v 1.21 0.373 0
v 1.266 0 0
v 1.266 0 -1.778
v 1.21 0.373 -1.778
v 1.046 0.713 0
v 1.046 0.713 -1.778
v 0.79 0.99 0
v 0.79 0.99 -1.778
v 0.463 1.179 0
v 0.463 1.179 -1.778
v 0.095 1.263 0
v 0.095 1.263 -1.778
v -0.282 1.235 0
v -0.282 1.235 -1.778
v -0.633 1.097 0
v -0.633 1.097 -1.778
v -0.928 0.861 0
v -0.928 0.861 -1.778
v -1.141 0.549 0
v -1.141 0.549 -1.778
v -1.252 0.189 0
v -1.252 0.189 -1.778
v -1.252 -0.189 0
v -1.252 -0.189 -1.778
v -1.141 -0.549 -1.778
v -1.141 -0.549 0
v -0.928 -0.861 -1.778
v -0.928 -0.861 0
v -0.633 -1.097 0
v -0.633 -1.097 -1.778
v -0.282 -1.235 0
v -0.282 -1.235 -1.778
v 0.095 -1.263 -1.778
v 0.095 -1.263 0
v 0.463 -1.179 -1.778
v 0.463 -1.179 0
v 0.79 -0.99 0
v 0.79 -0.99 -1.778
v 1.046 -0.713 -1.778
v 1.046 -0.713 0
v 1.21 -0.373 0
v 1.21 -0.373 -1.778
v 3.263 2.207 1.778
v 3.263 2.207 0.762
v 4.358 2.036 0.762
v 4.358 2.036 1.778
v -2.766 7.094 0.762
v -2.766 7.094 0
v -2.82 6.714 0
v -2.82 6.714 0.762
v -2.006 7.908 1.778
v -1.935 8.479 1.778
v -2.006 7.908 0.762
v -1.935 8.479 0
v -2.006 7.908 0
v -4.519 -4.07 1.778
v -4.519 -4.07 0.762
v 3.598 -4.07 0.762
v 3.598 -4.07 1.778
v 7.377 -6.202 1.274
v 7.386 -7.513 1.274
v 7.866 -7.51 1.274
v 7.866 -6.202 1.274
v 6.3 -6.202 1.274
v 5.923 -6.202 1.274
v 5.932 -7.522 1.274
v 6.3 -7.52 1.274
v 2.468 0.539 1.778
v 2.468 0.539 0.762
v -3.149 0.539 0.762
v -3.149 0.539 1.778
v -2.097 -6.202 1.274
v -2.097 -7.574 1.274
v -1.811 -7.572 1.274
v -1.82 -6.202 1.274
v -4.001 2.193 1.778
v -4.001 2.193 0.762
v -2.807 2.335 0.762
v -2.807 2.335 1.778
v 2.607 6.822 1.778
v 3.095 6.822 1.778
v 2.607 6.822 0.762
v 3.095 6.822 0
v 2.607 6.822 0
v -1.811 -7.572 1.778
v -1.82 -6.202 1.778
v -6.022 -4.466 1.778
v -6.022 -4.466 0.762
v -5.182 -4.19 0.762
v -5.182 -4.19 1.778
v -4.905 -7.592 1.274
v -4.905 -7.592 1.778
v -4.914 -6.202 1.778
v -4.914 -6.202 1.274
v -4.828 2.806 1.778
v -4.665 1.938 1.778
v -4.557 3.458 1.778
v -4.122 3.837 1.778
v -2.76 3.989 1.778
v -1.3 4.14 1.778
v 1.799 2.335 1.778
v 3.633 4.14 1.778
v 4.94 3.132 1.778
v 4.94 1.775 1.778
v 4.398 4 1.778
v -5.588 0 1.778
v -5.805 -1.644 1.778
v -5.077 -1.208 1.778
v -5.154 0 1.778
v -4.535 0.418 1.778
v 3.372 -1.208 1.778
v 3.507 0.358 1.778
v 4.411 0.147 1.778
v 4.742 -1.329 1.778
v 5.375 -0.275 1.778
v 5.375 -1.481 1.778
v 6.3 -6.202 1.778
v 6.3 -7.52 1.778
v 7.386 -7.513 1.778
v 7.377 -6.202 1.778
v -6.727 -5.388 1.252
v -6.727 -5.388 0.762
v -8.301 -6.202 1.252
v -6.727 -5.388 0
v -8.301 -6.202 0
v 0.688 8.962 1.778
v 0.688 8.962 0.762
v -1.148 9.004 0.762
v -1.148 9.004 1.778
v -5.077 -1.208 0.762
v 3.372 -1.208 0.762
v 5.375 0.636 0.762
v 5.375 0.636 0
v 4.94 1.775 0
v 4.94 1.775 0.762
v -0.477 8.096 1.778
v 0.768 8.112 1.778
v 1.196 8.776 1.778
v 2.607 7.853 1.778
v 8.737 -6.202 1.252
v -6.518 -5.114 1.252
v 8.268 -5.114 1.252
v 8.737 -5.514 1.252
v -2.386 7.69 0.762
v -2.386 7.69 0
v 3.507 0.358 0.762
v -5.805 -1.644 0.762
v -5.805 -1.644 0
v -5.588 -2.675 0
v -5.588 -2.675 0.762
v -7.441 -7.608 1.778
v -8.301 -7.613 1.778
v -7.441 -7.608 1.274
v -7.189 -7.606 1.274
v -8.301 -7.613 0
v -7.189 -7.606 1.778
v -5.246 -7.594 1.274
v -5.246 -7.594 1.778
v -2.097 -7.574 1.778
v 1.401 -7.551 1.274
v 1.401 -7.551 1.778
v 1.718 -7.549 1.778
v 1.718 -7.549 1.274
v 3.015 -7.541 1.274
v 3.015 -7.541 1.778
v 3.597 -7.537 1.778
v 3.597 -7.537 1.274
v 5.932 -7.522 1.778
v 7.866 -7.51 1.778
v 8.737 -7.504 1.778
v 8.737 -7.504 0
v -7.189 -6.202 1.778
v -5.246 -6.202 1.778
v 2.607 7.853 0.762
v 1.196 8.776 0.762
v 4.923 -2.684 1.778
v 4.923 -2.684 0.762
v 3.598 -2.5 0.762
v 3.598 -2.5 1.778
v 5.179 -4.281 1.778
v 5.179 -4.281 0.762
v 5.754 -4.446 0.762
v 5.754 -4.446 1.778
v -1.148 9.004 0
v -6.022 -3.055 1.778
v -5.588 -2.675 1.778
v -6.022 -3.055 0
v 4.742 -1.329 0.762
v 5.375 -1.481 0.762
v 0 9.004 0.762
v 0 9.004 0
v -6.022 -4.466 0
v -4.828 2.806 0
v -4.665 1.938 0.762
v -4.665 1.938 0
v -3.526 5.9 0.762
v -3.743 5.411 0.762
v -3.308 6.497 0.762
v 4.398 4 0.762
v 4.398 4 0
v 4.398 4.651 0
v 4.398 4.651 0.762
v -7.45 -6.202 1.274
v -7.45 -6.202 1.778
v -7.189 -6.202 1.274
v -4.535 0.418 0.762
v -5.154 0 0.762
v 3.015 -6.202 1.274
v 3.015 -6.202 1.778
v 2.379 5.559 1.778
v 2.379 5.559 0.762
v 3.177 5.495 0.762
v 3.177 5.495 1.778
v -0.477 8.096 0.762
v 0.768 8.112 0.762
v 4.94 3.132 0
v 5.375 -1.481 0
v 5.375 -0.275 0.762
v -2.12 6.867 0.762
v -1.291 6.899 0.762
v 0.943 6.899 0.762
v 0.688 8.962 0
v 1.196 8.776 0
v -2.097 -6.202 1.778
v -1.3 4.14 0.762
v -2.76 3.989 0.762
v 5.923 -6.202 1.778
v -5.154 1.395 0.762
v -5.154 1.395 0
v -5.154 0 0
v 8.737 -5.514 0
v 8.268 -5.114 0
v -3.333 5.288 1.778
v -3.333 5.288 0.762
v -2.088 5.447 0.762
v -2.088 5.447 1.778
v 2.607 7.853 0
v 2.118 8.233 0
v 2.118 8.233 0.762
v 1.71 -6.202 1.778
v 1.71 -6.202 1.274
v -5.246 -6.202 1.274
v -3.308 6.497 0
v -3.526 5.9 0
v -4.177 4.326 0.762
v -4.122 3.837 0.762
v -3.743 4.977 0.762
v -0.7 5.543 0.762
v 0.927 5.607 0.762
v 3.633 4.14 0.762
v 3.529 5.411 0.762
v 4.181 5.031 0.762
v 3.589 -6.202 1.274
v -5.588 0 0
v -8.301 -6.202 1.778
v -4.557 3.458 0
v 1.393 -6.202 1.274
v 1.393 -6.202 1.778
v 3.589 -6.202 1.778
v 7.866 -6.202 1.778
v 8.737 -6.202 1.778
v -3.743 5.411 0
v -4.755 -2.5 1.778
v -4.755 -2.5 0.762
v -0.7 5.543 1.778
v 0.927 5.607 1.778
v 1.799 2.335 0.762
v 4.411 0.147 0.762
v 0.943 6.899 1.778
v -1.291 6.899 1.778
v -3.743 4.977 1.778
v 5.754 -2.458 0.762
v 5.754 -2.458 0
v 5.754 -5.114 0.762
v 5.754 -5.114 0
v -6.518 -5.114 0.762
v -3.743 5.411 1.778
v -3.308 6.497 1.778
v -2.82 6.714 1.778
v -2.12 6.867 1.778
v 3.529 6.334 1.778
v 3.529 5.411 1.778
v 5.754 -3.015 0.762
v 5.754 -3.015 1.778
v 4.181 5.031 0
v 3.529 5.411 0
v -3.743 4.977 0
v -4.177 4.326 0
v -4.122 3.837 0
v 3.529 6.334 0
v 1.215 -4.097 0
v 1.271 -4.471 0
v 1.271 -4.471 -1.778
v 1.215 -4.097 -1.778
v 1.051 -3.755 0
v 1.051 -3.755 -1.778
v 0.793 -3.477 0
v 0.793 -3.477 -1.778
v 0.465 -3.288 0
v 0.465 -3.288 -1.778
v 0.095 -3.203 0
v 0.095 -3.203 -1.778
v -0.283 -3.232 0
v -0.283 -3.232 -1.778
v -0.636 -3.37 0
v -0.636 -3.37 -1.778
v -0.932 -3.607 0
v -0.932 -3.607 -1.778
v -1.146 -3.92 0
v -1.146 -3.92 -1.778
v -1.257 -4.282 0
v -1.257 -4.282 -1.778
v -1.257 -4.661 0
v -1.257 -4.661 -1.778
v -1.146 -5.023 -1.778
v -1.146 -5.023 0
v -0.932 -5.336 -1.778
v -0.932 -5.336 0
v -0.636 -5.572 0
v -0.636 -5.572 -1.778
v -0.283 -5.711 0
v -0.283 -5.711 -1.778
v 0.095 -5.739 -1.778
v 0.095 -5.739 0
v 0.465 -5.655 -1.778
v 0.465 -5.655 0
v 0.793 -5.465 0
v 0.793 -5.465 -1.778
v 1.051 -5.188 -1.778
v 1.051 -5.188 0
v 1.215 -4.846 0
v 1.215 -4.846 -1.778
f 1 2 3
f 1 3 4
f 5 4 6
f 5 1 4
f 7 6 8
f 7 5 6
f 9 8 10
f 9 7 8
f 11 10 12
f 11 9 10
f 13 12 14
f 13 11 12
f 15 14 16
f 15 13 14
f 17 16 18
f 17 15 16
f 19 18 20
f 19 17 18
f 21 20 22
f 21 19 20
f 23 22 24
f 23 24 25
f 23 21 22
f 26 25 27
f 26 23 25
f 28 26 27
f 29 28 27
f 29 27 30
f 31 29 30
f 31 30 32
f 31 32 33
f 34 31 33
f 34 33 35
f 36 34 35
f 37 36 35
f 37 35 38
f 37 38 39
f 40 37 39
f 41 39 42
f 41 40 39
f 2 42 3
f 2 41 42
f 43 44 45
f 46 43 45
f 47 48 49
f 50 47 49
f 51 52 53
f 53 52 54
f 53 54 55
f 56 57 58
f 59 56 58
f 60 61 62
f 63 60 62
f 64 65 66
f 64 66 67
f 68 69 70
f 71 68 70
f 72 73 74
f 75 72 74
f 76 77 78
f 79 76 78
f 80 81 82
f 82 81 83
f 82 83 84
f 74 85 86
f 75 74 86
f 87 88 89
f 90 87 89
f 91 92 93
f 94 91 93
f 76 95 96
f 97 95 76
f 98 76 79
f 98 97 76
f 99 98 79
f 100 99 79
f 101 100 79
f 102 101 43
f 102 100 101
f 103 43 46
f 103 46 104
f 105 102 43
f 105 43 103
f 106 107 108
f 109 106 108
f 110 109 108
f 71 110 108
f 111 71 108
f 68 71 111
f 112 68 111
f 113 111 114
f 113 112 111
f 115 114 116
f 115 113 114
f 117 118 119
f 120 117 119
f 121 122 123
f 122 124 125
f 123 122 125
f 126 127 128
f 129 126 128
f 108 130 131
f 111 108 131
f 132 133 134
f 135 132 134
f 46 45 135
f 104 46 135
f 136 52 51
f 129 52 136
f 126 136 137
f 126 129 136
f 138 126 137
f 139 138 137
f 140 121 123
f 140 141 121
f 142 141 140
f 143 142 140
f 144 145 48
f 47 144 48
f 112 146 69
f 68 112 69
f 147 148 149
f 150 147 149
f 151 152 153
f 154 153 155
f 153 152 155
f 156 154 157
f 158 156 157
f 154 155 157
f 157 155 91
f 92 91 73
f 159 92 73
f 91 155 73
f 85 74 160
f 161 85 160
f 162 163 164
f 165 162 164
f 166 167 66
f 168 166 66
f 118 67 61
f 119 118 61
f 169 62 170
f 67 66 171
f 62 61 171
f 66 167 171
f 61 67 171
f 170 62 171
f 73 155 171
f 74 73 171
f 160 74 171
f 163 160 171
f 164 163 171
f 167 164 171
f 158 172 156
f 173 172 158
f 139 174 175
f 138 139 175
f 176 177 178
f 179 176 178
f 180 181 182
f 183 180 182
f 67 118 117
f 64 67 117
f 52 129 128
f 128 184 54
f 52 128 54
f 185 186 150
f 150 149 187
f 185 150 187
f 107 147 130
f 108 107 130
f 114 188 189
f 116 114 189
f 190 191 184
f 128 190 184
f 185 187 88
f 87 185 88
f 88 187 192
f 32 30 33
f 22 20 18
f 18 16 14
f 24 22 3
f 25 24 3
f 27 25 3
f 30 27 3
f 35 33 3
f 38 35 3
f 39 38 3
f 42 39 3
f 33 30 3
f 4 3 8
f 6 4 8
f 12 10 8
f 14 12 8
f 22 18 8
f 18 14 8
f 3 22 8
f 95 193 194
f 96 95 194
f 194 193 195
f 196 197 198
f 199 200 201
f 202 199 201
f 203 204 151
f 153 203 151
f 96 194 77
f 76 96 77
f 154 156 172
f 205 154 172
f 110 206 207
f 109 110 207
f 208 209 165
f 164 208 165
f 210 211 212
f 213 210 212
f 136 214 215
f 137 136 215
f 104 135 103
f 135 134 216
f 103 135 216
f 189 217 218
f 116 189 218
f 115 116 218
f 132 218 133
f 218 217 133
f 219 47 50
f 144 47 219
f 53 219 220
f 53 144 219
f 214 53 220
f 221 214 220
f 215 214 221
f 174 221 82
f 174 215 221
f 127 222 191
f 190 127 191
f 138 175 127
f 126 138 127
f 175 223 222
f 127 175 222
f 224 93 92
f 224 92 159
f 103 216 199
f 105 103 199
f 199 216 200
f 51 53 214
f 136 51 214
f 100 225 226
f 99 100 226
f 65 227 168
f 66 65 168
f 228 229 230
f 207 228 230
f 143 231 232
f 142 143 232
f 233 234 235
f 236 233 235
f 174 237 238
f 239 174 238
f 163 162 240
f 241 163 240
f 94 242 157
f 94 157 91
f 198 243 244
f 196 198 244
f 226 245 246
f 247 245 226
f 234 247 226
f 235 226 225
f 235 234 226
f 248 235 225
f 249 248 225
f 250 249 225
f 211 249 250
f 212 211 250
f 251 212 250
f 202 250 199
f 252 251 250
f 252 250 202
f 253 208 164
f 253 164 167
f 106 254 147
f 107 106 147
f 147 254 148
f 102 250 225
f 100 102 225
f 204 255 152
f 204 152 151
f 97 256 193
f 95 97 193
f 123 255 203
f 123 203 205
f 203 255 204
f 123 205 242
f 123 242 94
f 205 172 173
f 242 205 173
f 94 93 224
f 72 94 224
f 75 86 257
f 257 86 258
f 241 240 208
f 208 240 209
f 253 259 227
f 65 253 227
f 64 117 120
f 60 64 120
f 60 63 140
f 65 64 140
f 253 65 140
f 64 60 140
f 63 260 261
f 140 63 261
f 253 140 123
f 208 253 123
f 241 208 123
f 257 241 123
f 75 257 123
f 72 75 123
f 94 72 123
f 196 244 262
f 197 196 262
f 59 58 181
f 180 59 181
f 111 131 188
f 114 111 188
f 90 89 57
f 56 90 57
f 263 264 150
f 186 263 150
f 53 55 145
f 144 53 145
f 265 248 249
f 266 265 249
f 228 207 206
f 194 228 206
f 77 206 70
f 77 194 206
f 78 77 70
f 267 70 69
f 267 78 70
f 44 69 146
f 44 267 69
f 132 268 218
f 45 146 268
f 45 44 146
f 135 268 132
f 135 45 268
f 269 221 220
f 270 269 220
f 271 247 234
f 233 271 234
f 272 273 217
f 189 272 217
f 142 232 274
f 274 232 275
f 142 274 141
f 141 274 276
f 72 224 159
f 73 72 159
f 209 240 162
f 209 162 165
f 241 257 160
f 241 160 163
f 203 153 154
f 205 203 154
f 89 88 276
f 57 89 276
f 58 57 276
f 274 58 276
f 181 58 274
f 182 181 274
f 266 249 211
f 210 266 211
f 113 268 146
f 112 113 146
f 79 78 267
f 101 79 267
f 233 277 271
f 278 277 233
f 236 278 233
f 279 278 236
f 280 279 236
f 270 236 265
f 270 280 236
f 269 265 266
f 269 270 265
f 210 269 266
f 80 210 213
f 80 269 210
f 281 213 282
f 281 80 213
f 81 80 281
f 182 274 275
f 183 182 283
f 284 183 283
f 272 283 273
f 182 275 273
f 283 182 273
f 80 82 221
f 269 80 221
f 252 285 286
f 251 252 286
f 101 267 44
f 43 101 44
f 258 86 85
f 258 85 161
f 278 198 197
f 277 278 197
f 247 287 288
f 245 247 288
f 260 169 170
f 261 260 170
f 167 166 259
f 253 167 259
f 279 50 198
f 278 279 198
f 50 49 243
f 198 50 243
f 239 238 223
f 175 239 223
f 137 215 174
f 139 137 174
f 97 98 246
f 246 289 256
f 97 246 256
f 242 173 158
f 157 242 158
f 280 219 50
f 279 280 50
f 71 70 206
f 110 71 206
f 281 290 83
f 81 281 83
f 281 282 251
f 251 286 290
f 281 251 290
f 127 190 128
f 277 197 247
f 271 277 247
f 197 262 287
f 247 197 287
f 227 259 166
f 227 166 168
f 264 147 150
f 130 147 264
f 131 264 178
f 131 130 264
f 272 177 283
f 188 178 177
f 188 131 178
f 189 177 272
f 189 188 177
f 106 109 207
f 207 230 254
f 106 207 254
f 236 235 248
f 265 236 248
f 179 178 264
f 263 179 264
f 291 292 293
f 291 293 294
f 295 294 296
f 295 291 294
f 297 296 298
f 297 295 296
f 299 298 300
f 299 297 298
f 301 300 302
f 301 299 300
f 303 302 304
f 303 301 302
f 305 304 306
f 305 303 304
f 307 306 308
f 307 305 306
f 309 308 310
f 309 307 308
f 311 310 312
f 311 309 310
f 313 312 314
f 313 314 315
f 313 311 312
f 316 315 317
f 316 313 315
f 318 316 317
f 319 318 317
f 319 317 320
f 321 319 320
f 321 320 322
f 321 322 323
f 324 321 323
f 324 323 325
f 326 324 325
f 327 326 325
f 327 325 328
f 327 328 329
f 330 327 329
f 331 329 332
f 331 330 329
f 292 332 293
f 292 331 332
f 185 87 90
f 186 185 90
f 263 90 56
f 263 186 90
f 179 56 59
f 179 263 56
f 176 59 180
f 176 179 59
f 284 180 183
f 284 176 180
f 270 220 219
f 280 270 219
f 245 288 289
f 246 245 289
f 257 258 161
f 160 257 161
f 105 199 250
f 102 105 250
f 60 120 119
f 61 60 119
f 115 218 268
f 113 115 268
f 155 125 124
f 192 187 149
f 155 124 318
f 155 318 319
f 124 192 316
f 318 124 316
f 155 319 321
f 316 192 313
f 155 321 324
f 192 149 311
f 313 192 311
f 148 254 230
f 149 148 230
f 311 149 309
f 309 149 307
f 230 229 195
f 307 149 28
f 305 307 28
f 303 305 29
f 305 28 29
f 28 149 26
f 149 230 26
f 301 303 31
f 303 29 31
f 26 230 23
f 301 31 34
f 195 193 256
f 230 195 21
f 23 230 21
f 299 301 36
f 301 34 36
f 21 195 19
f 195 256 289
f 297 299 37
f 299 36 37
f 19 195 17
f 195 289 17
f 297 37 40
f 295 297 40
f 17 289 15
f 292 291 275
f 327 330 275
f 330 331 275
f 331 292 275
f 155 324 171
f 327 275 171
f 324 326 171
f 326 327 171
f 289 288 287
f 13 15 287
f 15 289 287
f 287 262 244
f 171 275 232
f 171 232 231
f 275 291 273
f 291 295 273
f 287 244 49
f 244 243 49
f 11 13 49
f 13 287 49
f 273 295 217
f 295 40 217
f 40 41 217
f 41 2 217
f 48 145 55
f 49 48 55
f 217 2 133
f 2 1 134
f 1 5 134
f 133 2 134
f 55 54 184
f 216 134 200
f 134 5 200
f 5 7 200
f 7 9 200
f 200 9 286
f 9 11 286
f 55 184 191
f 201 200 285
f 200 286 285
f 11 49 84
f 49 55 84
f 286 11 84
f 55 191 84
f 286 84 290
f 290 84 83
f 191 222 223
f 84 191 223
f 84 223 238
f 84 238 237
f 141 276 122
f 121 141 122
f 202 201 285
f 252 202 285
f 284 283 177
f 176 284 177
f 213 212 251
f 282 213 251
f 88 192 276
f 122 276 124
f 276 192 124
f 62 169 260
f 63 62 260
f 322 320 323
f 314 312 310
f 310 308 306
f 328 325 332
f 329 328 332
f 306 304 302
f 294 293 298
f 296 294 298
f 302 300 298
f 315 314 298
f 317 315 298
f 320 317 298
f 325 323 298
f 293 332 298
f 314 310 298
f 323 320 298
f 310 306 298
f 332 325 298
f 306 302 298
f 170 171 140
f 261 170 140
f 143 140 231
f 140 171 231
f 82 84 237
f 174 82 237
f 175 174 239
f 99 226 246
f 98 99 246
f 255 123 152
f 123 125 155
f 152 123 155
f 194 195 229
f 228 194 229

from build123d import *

# Parameters (mm, degrees)
F2_DEPTH  = 0.762
F4_DEPTH  = 1.016
F6_DEPTH  = 1.016
F8_DEPTH  = 0.5258
F0_R      = 12.7
F10_DEPTH = 0.50448
F11_R     = 1.2664455111
F11_R_2   = 1.2714517288
F12_DEPTH = 1.778


with BuildPart() as f2:
    # F1 (on face) → F2 (new body)
    with BuildSketch(Plane.XY):
        Polygon((-8.301156573, -6.202286575), (-8.301156573, -7.6132696122), (8.7365023792, -7.5040537175), (8.7365023792, -5.5138876204), (8.2679493353, -5.1142387092), (5.7544014417, -5.1142387092), (5.7544014417, -2.8919042088), (5.7544014417, -2.4577556178), (5.3745214827, -1.4809214044), (5.3745214827, -0.9925042978), (5.3745214827, 0), (5.3745214827, 0.6355526857), (4.9403728917, 1.7751924461), (4.9403728917, 2.4806838483), (4.9403728917, 3.1319067348), (4.3976870365, 4.000203684), (4.3976870365, 4.6514268033), (4.1806129739, 5.0313062966), (3.529390553, 5.4111862555), (3.529390553, 6.3337520696), (3.0952417292, 6.8221688271), (2.6068247389, 6.8221688271), (2.6068247389, 7.853272371), (2.1184075158, 8.2331513986), (1.1958420509, 8.7758377194), (0.6879131543, 8.9615155011), (0, 9.0042492375), (-1.1481875752, 9.0042492375), (-1.9346952904, 8.4792003036), (-2.0060034003, 7.9075405374), (-2.3858833592, 7.6904660091), (-2.7657633182, 7.0935124531), (-2.8200319503, 6.7136320285), (-3.3084489405, 6.4965579659), (-3.5255230032, 5.8996034786), (-3.7425975315, 5.4111862555), (-3.7425975315, 4.9770376645), (-4.1767461225, 4.3258150108), (-4.1224774905, 3.8373982534), (-4.5566260815, 3.4575182945), (-4.8279687762, 2.8062951751), (-4.6651633456, 1.9379982259), (-5.1535801031, 1.3953124871), (-5.1535801031, 0), (-5.5877286941, 0), (-5.8048027568, -1.6437270679), (-5.5877286941, -2.6748299133), (-6.0218772851, -3.0547098722), (-6.0218772851, -4.4656926766), (-6.7273690365, -5.3882584907), align=None)
    extrude(amount=F2_DEPTH)

    # F3 (on face) → F4 (join)
    with BuildSketch(Plane.XY.offset(0.762)):
        Polygon((-8.301156573, -7.6132696122), (8.7365023792, -7.5040537175), (8.7365023792, -5.5138876204), (8.2679493353, -5.1142387092), (5.7544014417, -5.1142387092), (-6.5178244245, -5.1142387092), (-6.7273690365, -5.3882584907), (-8.301156573, -6.202286575), align=None)
    extrude(amount=F4_DEPTH)

    # F5 (on face) → F6 (join)
    with BuildSketch(Plane.XY.offset(0.762)):
        Polygon((-1.9346952904, 8.4792003036), (-2.0060034003, 7.9075405374), (-0.4768302024, 8.0958995968), (0.7676923415, 8.1118550152), (2.6068247389, 7.853272371), (1.1958420509, 8.7758377194), (0.6879131543, 8.9615155011), (-1.1481875752, 9.0042492375), align=None)
        Polygon((-2.1202382632, 6.8673328497), (-2.8200319503, 6.7136320285), (-3.3084489405, 6.4965579659), (-3.7425975315, 5.4111862555), (-3.7425975315, 4.9770376645), (-3.3328498248, 5.2877464332), (-2.0883274265, 5.4473006167), (-0.7002060302, 5.5430331267), (0.927246525, 5.6068548001), (2.3791892454, 5.5589885451), (3.1769601628, 5.4951668717), (3.529390553, 5.4111862555), (3.529390553, 6.3337520696), (3.0952417292, 6.8221688271), (2.6068247389, 6.8221688271), (0.9432018269, 6.8992436863), (-1.290556509, 6.8992436863), align=None)
        Polygon((-2.7597796666, 3.9888094114), (-4.1224774905, 3.8373982534), (-4.5566260815, 3.4575182945), (-4.8279687762, 2.8062951751), (-4.6651633456, 1.9379982259), (-4.0006320924, 2.1927114576), (-2.8066006489, 2.334858058), (-1.3140613446, 2.334858058), (0.1642632997, 2.334858058), (1.7989494372, 2.334858058), (3.263059305, 2.2069262341), (4.3575884774, 2.0363503136), (4.9403728917, 1.7751924461), (4.9403728917, 3.1319067348), (4.3976870365, 4.000203684), (3.6326404661, 4.1401199996), (2.3959649261, 4.1401199996), (0.8465670398, 4.1401199996), (-1.2998466846, 4.1401199996), align=None)
        Polygon((-5.5877286941, 0), (-5.8048027568, -1.6437270679), (-5.076691974, -1.2083072215), (-3.9773182943, -1.2083072215), (-1.5074934345, -1.2083072215), (0.9020918515, -1.2083072215), (3.3719167113, -1.2083072215), (4.7423685901, -1.3287864858), (5.3745214827, -1.4809214044), (5.3745214827, -0.2745929523), (4.4110501185, 0.1470844581), (3.5074558109, 0.3579231852), (2.4683221709, 0.5386420526), (0, 0.5386420526), (-3.1490232795, 0.5386420526), (-4.53453511, 0.4181628174), (-5.1535801031, 0), align=None)
        Polygon((-5.5877286941, -2.6748299133), (-6.0218772851, -3.0547098722), (-6.0218772851, -4.4656926766), (-5.1821111701, -4.1901692748), (-4.5194751583, -4.0696901269), (-2.0044704434, -4.0696901269), (1.4593084343, -4.0696901269), (3.5978152882, -4.0696901269), (5.1791053265, -4.2805285193), (5.7544014417, -4.4461875223), (5.7544014417, -3.0154963024), (4.9230875447, -2.6841785293), (3.5978152882, -2.4995030768), (1.3388292864, -2.4995030768), (-2.4412076455, -2.4995030768), (-4.7549253743, -2.4995030768), align=None)
    extrude(amount=F6_DEPTH)

    # F7 (on face) → F8 (cut)
    with BuildSketch(Plane.XY.offset(1.778)):
        Polygon((-6.7273690365, -5.3882584907), (-8.301156573, -6.202286575), (8.7365023792, -6.202286575), (8.7365023792, -5.5138876204), (8.2679493353, -5.1142387092), (-6.5178244245, -5.1142387092), align=None)
    extrude(amount=-F8_DEPTH, mode=Mode.SUBTRACT)

    # F9 (on face) + F0 (on Top) → F10 (cut)
    with BuildSketch(Plane.XY.offset(1.778)):
        Polygon((-7.4496113843, -6.202286575), (-7.4406019717, -7.6077532299), (-7.1891224943, -7.60614118), (-7.1891224943, -6.202286575), align=None)
        Polygon((-5.2457139827, -6.202286575), (-5.2457139827, -7.593683418), (-4.905404364, -7.5915019435), (-4.9143096015, -6.202286575), align=None)
        Polygon((-2.0974383224, -6.202286575), (-2.0974383224, -7.5735021394), (-1.8112884347, -7.571667843), (-1.8200665304, -6.202286575), align=None)
        Polygon((7.377400318, -6.202286575), (7.3858004916, -7.5127120734), (7.8655239195, -7.5096369195), (7.8655239195, -6.202286575), align=None)
        Polygon((5.9232353463, -6.202286575), (5.9316952713, -7.522033272), (6.3001448289, -7.519671413), (6.3001448289, -6.202286575), align=None)
        Polygon((3.014677437, -6.202286575), (3.014677437, -7.5407321269), (3.5971800525, -7.5369981313), (3.5886241988, -6.202286575), align=None)
        Polygon((1.3927921775, -6.202286575), (1.4014382575, -7.5510734162), (1.7183985864, -7.5490416168), (1.7097655308, -6.202286575), align=None)
    with BuildSketch(Plane.XY):
        Circle(F0_R)
    extrude(amount=-F10_DEPTH, mode=Mode.SUBTRACT)

    # F11 (on face) → F12 (join)
    with BuildSketch(Plane.XY):
        Circle(F11_R)
        with Locations((0, -4.4713900425)):
            Circle(F11_R_2)
    extrude(amount=-F12_DEPTH)


solid = f2.part
